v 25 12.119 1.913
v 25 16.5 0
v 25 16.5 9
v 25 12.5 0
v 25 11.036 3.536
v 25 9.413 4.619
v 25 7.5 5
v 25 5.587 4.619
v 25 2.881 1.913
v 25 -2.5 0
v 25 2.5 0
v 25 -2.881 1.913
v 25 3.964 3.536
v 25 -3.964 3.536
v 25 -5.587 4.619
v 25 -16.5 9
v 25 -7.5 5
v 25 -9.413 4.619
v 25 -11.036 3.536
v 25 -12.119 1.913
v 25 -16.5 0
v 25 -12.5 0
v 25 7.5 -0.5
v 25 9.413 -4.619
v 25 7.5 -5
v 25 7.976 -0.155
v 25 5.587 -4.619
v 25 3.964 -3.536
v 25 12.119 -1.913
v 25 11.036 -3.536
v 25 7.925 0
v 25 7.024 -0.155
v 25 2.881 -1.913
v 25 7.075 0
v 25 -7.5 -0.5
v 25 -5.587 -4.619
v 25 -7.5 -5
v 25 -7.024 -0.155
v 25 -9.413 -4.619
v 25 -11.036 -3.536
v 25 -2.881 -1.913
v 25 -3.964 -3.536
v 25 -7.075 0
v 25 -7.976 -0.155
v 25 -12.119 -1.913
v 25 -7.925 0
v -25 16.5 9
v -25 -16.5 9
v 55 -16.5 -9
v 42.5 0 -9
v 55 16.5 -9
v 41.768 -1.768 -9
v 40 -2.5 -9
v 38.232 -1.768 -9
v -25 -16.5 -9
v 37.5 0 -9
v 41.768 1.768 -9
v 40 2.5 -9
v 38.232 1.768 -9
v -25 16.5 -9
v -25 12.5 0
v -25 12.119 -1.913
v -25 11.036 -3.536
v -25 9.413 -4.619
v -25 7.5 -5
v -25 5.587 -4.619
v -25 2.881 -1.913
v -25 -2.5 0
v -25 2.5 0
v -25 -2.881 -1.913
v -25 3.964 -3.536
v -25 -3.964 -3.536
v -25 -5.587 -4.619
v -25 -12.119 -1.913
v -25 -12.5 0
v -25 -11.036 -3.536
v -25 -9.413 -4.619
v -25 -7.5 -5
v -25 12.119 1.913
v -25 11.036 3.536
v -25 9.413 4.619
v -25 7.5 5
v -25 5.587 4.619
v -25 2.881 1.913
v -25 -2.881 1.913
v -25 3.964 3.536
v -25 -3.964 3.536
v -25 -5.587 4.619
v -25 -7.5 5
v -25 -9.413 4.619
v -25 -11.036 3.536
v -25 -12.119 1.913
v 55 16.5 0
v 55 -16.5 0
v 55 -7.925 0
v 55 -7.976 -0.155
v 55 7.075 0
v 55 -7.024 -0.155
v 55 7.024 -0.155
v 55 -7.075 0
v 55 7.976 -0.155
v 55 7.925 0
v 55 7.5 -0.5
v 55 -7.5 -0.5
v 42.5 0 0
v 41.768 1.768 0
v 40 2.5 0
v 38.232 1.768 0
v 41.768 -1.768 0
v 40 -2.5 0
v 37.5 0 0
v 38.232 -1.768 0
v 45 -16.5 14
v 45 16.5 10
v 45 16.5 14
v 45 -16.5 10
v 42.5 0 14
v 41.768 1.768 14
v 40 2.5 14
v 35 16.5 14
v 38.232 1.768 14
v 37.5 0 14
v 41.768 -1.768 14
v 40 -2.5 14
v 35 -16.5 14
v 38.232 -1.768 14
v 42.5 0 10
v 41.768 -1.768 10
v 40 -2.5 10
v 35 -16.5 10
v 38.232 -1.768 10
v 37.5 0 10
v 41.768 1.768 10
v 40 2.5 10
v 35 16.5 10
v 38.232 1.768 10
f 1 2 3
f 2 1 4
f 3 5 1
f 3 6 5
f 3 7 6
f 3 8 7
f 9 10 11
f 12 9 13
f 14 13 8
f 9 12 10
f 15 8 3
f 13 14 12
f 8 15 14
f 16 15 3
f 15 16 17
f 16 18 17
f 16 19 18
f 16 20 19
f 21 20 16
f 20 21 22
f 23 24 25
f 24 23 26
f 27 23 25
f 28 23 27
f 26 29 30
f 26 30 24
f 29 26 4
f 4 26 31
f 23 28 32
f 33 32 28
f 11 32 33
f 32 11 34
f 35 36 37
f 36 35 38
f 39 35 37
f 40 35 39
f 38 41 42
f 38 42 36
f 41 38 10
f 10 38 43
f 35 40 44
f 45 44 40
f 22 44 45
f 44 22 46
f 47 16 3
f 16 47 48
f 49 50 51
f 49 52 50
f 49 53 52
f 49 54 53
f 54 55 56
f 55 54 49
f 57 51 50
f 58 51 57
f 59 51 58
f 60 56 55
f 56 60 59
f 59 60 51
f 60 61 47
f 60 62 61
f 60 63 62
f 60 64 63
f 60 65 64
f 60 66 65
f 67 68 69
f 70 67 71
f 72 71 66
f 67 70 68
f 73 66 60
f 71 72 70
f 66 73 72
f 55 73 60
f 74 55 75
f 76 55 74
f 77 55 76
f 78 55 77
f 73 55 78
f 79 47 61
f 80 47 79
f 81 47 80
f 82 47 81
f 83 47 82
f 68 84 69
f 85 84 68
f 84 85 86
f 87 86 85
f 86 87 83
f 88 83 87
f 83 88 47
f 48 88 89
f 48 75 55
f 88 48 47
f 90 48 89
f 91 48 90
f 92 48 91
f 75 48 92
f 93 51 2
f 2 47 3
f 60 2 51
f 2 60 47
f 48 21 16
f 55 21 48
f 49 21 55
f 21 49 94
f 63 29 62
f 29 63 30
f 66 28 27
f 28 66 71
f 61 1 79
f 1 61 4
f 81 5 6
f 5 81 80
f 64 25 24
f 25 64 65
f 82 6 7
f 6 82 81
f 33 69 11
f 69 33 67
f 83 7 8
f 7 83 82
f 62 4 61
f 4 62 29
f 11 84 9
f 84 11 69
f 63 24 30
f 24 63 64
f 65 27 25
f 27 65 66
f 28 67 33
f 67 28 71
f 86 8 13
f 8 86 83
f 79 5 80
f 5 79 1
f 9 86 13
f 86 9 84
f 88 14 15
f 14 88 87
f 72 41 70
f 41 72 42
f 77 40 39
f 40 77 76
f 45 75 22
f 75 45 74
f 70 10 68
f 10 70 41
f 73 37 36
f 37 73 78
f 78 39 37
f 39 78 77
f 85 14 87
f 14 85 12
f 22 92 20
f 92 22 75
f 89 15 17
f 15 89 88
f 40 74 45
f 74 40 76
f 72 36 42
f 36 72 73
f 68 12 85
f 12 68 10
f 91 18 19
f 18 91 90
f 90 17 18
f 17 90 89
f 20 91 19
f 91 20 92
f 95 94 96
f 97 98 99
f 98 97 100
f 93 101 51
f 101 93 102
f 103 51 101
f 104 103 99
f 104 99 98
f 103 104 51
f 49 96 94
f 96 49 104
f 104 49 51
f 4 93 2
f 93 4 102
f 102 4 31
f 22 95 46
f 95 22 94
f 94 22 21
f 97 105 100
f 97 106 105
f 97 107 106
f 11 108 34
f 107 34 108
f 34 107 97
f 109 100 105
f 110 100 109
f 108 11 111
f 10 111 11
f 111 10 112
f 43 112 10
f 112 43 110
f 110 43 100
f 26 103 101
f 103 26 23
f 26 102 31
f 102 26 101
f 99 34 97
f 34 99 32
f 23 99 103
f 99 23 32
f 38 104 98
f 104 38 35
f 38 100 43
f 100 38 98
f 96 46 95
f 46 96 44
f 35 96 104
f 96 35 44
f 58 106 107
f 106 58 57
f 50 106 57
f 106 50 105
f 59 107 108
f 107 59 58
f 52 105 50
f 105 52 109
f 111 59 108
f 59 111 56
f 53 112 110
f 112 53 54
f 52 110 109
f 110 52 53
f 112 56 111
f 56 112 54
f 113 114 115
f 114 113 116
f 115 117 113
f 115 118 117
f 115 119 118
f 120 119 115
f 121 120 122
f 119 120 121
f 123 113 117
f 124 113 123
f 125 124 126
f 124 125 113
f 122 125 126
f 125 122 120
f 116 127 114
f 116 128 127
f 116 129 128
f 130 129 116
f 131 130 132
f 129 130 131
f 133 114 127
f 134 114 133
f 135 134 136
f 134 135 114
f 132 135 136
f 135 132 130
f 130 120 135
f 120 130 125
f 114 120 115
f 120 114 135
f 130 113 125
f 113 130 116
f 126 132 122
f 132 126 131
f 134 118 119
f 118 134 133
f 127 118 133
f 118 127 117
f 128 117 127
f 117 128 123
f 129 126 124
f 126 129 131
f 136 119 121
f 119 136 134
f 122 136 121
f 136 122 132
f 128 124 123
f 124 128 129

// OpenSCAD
flag_throw_together = true;

// design variables (in mm)
//## Cap
electrode_d = 1;
platform_l = 30;

holder_grip_l = 50;
grip_thick = 4;

holder_d = 10;
holder_gap = 5;

//## Stopper
l_stopper = 10;
h_stopper = 4;
d_screw = 5;

// __program_variables
h_cap = holder_d + 2*grip_thick;
w_cap = 2*holder_d + 2*grip_thick + holder_gap;
offset_grip_side = (holder_d+holder_gap)/2;
offset_platform = (holder_grip_l+platform_l)/2;
offset_screw = offset_platform;

module get_cap(x=0,y=0,z=0){ translate([x,y,z]){
    // cap base 
    difference()
    {
        cube([holder_grip_l, w_cap, h_cap], center=true);
        translate([0,offset_grip_side,0]) rotate([0,90,0]) 
        cylinder(h=holder_grip_l+1, d=holder_d, center=true);
        translate([0,-offset_grip_side,0]) rotate([0,90,0]) 
        cylinder(h=holder_grip_l+1, d=holder_d, center=true);    
    }

    //electrode platform
    difference()
    {
        translate([offset_platform, 0, -h_cap/4]) 
        cube([platform_l,w_cap, h_cap/2], center=true);
        translate([offset_platform,offset_grip_side,0]) rotate([0,90,0]) 
        cylinder(h=platform_l+1, d=electrode_d, center=true);
        translate([offset_platform,-offset_grip_side,0]) rotate([0,90,0]) 
        cylinder(h=platform_l+1, d=electrode_d, center=true);
        translate([offset_screw,0,0]) 
        cylinder(h=h_cap+1, d=d_screw, center=true);  
    }
}}

module get_stopper(x=0,y=0,z=0){ translate([x,y,z]){
    translate([0, 0, h_stopper/2])
    difference(){ 
        cube([l_stopper,w_cap, h_stopper], center=true);
        cylinder(h=h_stopper+1, d=d_screw, center=true);
    }
}}


module main(){
    if (flag_throw_together)
    {
        get_cap();
        get_stopper(offset_screw,0, 10);
    }
    else
    {
        get_cap();
        //get_stopper();
    }   
}

main();
